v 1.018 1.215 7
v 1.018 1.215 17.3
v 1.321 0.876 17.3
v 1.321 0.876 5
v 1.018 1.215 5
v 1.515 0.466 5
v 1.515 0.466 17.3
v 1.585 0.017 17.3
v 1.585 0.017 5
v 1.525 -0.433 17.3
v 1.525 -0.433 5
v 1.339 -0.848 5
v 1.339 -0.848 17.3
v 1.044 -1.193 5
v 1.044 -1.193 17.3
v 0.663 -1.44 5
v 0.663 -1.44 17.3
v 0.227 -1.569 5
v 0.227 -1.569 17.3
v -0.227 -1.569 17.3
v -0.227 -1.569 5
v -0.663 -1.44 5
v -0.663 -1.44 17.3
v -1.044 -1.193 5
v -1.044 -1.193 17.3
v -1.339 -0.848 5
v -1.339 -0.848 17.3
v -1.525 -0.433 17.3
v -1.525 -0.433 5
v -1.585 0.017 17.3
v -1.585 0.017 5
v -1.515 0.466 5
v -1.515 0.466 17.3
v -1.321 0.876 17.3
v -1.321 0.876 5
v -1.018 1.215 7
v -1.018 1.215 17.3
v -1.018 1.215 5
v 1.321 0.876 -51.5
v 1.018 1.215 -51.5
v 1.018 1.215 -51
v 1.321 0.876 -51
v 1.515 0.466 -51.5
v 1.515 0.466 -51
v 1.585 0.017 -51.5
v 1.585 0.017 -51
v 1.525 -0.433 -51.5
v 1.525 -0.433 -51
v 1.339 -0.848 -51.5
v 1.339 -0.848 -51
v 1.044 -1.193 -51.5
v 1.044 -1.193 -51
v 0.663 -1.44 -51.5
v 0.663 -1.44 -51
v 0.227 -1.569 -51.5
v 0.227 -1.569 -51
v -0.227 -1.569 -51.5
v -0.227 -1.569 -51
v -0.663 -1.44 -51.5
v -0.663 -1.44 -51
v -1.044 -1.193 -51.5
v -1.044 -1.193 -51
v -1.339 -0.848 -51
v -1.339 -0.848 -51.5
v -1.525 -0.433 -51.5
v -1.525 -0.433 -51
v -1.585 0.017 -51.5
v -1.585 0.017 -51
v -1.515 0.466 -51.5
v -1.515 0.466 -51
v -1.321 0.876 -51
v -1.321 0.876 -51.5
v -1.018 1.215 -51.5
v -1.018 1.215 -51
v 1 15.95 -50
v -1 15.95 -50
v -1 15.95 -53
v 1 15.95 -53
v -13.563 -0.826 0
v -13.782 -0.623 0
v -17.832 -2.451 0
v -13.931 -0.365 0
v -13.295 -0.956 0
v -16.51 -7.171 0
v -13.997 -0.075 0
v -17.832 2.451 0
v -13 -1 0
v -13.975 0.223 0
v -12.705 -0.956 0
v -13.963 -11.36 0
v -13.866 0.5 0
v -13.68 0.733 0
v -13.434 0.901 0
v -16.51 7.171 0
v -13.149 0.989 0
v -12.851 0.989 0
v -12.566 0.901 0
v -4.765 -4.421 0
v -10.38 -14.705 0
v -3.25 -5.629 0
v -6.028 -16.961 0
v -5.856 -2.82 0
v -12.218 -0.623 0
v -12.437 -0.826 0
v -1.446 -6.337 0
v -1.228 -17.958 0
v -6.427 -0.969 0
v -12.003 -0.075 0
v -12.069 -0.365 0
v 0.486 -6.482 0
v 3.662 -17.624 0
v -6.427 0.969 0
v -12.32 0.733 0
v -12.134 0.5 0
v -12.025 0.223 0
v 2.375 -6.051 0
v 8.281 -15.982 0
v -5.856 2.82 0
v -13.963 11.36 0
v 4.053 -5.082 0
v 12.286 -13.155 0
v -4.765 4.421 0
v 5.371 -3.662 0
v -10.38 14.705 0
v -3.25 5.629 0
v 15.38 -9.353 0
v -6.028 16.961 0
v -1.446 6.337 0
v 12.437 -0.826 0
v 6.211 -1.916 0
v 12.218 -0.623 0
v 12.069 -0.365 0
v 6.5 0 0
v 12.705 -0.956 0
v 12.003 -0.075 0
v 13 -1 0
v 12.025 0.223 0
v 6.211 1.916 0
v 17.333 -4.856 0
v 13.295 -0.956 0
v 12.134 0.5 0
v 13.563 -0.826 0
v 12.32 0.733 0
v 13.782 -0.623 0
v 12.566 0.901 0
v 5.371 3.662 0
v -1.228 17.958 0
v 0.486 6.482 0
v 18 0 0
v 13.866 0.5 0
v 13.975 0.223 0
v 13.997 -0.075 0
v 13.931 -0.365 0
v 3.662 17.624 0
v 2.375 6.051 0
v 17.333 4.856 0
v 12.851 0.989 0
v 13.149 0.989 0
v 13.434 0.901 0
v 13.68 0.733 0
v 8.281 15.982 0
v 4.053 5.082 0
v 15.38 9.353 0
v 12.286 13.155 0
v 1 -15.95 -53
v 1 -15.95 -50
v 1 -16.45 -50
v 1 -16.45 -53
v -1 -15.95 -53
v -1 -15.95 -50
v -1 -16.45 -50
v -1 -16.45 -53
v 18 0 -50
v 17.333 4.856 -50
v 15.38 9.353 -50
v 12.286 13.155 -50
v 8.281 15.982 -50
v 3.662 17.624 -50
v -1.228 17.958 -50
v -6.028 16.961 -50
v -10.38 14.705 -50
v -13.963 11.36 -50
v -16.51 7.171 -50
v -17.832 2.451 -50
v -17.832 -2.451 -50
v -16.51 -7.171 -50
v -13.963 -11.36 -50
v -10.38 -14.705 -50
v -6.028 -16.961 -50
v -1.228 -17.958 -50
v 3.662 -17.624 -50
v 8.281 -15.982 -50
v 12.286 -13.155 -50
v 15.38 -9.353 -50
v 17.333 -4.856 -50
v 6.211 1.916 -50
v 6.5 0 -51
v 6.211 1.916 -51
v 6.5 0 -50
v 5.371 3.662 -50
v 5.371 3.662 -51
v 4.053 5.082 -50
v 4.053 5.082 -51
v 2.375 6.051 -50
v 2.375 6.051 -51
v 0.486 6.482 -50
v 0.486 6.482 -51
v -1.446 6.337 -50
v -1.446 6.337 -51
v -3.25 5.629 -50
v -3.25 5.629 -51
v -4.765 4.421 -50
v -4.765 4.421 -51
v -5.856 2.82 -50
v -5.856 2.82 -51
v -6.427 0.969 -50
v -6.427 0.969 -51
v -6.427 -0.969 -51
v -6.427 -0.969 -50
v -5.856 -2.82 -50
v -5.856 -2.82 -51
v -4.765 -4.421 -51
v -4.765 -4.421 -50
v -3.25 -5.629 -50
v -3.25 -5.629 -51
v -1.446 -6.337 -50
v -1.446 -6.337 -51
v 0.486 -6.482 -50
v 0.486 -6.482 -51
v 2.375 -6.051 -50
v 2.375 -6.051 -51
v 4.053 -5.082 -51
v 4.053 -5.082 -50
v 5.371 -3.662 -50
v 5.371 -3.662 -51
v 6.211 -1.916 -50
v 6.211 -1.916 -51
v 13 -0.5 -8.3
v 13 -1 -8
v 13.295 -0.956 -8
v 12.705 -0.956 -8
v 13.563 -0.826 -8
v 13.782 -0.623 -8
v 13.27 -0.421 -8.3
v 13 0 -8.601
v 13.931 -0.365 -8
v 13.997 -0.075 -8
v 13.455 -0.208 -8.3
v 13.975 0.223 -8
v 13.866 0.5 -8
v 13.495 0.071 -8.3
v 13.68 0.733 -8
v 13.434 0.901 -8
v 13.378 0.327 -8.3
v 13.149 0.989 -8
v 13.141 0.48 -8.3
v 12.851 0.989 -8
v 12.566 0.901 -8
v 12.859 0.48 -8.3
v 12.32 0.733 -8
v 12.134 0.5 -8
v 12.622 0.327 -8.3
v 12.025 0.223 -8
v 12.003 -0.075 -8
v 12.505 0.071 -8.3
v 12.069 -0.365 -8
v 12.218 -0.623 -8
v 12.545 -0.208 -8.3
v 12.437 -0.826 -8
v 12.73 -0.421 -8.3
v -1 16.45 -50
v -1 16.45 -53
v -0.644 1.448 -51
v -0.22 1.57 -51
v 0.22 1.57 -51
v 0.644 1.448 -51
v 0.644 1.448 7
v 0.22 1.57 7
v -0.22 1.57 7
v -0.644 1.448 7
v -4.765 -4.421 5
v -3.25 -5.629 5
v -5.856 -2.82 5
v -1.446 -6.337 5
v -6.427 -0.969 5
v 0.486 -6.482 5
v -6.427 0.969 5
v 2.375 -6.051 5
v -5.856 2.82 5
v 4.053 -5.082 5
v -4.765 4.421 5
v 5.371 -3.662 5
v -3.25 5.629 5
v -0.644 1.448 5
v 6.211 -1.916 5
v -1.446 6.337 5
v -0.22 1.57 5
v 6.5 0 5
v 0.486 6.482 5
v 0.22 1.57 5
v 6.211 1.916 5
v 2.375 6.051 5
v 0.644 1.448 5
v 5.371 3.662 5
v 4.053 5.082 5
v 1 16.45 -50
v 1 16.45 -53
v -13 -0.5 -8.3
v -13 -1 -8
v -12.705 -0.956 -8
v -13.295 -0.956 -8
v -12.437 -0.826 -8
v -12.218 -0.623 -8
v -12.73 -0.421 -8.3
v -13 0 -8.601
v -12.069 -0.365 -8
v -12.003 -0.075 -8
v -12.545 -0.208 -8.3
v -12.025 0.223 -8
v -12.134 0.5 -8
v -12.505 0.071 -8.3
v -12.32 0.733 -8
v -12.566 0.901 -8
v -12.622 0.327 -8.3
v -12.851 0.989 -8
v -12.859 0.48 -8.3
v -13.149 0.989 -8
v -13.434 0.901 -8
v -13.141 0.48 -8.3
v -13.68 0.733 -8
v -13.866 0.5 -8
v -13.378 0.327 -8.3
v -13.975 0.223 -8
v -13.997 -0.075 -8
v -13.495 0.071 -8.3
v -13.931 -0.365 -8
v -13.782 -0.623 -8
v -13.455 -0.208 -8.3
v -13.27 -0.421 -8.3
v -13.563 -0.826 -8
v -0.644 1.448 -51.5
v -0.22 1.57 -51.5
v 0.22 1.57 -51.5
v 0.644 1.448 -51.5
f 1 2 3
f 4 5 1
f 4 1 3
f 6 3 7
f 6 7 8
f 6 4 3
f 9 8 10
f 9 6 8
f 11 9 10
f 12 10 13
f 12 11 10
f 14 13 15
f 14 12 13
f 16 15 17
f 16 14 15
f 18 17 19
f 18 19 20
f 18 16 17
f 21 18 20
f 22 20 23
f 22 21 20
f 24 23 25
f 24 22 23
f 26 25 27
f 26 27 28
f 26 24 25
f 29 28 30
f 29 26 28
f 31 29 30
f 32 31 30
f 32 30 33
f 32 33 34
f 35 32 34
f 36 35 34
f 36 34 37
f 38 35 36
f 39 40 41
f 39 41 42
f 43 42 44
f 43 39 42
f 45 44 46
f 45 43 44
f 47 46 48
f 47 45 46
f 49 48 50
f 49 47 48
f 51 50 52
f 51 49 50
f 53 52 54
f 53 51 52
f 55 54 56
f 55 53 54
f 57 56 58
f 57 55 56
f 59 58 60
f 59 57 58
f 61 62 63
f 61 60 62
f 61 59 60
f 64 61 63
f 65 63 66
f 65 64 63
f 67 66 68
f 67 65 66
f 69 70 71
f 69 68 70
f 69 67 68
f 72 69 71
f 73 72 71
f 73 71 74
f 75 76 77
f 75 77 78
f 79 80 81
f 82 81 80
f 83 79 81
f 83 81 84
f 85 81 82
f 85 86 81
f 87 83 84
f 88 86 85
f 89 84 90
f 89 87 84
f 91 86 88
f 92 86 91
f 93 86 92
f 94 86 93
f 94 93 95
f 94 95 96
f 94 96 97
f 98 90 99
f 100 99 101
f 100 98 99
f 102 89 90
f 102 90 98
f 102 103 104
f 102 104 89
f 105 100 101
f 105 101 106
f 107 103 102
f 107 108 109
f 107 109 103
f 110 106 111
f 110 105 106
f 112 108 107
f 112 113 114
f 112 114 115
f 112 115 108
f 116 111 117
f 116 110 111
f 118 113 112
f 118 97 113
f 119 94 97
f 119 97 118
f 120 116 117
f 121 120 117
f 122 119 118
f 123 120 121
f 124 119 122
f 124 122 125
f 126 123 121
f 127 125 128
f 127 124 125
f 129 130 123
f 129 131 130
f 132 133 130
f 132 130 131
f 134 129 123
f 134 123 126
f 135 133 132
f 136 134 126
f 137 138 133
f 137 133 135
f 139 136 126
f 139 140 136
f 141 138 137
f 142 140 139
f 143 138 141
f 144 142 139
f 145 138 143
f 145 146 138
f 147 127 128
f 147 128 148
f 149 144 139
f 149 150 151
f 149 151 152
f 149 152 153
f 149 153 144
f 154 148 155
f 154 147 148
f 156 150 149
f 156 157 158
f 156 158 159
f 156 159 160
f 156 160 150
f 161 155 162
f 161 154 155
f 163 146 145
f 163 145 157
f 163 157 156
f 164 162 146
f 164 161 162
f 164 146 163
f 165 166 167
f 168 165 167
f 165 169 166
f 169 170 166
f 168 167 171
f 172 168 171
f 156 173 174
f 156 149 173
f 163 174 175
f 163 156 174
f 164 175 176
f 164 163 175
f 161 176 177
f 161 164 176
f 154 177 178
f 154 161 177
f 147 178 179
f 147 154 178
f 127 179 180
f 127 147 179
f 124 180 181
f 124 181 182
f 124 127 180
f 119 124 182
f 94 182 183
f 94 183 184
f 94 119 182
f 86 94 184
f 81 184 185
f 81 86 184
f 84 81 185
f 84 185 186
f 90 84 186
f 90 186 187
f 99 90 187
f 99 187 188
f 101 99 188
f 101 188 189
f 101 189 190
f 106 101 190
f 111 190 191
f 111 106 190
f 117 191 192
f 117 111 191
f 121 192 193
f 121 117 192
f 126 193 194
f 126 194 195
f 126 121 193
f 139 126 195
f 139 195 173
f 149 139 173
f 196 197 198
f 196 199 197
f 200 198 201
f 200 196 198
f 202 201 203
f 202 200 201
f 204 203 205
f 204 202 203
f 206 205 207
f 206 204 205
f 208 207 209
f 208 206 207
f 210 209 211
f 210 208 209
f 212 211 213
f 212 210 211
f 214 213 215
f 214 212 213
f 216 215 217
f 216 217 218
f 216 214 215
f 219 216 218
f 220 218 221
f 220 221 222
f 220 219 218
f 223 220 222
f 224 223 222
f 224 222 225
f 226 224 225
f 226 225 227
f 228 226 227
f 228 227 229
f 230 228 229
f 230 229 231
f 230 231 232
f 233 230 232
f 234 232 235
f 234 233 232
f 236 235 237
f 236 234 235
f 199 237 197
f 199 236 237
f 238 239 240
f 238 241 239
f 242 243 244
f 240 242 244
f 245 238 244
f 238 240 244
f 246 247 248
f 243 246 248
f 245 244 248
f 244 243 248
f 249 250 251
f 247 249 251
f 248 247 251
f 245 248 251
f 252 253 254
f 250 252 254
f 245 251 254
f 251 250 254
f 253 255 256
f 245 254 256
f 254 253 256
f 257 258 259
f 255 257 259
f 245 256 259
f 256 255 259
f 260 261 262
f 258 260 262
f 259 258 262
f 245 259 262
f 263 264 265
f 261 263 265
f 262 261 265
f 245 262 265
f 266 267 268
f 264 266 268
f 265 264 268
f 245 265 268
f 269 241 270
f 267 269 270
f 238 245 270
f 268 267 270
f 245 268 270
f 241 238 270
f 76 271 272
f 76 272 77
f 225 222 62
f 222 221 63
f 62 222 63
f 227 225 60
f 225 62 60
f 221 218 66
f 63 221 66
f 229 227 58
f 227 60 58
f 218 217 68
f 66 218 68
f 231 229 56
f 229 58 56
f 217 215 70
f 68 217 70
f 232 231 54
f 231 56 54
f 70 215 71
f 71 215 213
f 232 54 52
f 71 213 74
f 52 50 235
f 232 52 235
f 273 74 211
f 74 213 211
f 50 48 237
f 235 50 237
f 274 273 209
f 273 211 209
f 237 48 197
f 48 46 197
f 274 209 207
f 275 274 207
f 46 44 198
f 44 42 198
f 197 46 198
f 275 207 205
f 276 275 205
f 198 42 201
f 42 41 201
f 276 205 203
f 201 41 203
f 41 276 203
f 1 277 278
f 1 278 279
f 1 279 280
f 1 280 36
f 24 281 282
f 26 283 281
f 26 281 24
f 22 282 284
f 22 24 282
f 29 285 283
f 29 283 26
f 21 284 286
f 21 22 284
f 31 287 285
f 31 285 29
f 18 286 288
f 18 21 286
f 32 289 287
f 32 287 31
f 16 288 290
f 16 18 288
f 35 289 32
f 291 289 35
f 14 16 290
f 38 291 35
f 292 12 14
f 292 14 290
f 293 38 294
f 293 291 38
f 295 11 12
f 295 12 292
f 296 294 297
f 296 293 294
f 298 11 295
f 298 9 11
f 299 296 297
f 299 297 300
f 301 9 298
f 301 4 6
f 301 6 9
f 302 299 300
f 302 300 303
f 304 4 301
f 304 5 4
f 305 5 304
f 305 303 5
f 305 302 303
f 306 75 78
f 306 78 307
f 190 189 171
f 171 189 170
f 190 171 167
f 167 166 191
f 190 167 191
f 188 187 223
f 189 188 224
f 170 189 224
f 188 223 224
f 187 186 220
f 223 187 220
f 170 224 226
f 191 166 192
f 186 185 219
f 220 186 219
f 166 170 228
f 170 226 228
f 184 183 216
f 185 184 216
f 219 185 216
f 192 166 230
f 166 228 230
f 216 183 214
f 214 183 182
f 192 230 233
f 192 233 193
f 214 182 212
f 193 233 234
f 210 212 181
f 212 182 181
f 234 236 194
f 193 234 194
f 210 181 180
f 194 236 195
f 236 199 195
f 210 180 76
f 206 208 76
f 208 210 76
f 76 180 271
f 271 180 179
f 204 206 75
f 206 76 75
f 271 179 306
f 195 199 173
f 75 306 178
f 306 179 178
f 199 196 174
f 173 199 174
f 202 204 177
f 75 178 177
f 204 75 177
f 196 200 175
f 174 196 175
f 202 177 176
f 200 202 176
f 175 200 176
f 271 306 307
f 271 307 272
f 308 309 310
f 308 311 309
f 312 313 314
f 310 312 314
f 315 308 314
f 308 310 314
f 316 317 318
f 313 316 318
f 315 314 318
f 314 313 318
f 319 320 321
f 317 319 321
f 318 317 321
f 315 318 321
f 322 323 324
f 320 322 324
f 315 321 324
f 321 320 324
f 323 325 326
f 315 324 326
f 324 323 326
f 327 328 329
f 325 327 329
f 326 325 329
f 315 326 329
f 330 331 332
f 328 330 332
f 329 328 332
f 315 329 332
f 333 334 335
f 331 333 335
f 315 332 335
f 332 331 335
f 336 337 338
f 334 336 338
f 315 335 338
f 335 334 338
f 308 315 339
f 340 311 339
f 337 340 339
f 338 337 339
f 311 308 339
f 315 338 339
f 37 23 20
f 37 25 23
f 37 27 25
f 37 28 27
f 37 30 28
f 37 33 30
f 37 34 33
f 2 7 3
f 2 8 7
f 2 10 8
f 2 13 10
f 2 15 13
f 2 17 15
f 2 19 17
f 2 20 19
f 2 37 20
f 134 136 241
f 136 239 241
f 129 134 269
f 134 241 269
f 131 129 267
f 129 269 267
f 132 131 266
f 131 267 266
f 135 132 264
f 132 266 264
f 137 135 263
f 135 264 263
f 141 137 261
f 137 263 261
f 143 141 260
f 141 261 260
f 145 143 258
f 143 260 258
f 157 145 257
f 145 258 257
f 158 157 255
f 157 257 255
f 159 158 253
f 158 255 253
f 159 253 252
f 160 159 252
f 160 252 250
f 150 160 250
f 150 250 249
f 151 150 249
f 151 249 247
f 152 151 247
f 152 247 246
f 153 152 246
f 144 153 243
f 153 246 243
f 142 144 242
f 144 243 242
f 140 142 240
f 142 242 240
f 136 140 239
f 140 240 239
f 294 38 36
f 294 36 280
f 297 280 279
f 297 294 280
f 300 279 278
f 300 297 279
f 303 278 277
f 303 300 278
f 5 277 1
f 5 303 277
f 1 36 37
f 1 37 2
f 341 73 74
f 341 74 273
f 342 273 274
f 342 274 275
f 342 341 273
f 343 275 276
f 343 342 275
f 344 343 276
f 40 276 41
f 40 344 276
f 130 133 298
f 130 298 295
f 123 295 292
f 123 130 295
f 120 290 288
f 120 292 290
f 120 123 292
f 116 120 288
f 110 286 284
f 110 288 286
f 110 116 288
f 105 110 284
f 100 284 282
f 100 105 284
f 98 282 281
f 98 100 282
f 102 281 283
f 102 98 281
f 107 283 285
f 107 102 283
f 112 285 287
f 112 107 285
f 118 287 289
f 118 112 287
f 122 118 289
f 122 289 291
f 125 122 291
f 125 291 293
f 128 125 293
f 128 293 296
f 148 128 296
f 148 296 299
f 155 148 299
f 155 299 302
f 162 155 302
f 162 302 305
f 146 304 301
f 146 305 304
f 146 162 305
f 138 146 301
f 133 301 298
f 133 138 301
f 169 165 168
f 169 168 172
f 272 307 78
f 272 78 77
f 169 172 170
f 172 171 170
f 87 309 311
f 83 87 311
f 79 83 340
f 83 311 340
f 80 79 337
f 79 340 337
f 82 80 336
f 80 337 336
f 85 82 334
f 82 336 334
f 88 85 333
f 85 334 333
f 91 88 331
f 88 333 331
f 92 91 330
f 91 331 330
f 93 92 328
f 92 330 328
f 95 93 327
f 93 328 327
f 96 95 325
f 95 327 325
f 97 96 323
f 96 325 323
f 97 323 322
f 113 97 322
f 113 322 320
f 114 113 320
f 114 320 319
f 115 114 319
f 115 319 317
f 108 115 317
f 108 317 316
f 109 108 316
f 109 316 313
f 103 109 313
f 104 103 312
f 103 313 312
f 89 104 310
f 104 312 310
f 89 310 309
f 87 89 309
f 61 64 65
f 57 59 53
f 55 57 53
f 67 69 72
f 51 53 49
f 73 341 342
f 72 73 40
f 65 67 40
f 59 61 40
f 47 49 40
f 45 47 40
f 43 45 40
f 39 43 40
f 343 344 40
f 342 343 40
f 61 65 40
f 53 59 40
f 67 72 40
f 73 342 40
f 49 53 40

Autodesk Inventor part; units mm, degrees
ref_plane "YZ Plane" through (0, 0, 0) normal (1, 0, 0) x (0, 1, 0)
ref_plane "XZ Plane" through (0, 0, 0) normal (0, 1, 0) x (-1, 0, 0)
ref_plane "XY Plane" through (0, 0, 0) normal (0, 0, 1) x (1, 0, 0)
sketch "Sketch1" plane through (0, 0, 0) normal (0, 0, 1) x (1, 0, 0)
  circle A0 centre (0, 0) radius 18
  circle A1 centre (0, 0) radius 6.5
  arc A2 (-1.0178, 1.215) -> (1.0178, 1.215) centre (0, 0) ccw
  line L0 (-1.585, 0) -> (1.585, 0)
  line L1 (-1.0178, 1.215) -> (1.0178, 1.215)
  circle A3 centre (13, 0) radius 1
  line L2 (0, -18) -> (0, 18) construction
  circle A4 centre (-13, 0) radius 1
  circle A5 centre (0, 0) radius 1.585
  point P0 (1.0178, 1.215)
  point P1 (-1.0178, 1.215)
  dimension "d0" = 36
  dimension "d1" = 13
  dimension "d2" = 3.17
  dimension "d3" = 1.215
  dimension "d4" = 13
  dimension "d5" = 2
  dimension "d6" = 13
  dimension "d7" = 2
  dimension "d36" = 3.17
extrude "Extrusion1" add sketch "Sketch1" along normal blind 17.3 and the other way blind 51.5 contours L1 A2 L0 | L0 A2
extrude "Extrusion2" add sketch "Sketch1" along normal blind 5 and the other way blind 51 contours A1 | A5 L1
extrude "Extrusion3" add sketch "Sketch1" against normal blind 50 contours A0 | A3 | A4
hole "Hole2" at (0, 0, 0) at (13, 0, 0) at (-13, 0, 0) direction (0, 0, -1) diameter 2 depth 8 tip angle 118
thread "Thread1" size "M2x0.4" class "6H" standard "ANSI Metric M Profile" full length
thread "Thread2" size "M2x0.4" class "6H" standard "ANSI Metric M Profile" full length
extrude "Extrusion4" add sketch "Sketch1" along normal blind 7 and the other way blind 51.5 contours L1 A2 L0 | A5 L1 | L0 A2
sketch "Sketch2" plane through (0, 0, -50) normal (0, 0, -1) x (-1, 0, 0)
  line L0 (-1, 16.45) -> (1, 16.45)
  line L1 (1, 16.45) -> (1, 15.95)
  line L2 (1, 15.95) -> (-1, 15.95)
  line L3 (-1, 15.95) -> (-1, 16.45)
  line L4 (-1, 16.45) -> (1, 15.95) construction
  line L5 (1, 16.45) -> (-1, 15.95) construction
  line L6 (0, 0) -> (0, 18) construction
  circle A0 centre (0, 0) radius 18 projected
  line L7 (0, 0) -> (-18, 0) construction
  line L8 (-1, -16.45) -> (1, -16.45)
  line L9 (1, -16.45) -> (1, -15.95)
  line L10 (1, -15.95) -> (-1, -15.95)
  line L11 (-1, -15.95) -> (-1, -16.45)
  line L12 (-1, -16.45) -> (1, -15.95) construction
  line L13 (1, -16.45) -> (-1, -15.95) construction
  point P0 (0, 16.2)
  point P1 (0, -16.2)
  dimension "d41" = 2
  dimension "d42" = 0.5
extrude "Extrusion5" add sketch "Sketch2" along normal blind 3 contours L0 L1 L2 L3 | L11 L10 L9 L8
properties part number "Motor" material "Stainless Steel"
